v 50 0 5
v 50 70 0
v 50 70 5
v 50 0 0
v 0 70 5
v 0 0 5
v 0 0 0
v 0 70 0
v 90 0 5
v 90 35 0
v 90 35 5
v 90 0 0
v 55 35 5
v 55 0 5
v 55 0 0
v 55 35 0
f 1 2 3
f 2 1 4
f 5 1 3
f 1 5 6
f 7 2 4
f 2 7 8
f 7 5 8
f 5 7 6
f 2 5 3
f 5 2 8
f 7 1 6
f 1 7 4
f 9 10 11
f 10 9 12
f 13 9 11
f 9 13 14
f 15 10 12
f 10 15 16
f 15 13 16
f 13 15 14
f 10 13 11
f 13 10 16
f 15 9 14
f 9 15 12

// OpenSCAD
module top()
{
  cube([50, 70, 5]);
}

module bottom()
{
  cube([35, 35, 5]);
}


top();

translate([55, 0, 0])
  bottom();
